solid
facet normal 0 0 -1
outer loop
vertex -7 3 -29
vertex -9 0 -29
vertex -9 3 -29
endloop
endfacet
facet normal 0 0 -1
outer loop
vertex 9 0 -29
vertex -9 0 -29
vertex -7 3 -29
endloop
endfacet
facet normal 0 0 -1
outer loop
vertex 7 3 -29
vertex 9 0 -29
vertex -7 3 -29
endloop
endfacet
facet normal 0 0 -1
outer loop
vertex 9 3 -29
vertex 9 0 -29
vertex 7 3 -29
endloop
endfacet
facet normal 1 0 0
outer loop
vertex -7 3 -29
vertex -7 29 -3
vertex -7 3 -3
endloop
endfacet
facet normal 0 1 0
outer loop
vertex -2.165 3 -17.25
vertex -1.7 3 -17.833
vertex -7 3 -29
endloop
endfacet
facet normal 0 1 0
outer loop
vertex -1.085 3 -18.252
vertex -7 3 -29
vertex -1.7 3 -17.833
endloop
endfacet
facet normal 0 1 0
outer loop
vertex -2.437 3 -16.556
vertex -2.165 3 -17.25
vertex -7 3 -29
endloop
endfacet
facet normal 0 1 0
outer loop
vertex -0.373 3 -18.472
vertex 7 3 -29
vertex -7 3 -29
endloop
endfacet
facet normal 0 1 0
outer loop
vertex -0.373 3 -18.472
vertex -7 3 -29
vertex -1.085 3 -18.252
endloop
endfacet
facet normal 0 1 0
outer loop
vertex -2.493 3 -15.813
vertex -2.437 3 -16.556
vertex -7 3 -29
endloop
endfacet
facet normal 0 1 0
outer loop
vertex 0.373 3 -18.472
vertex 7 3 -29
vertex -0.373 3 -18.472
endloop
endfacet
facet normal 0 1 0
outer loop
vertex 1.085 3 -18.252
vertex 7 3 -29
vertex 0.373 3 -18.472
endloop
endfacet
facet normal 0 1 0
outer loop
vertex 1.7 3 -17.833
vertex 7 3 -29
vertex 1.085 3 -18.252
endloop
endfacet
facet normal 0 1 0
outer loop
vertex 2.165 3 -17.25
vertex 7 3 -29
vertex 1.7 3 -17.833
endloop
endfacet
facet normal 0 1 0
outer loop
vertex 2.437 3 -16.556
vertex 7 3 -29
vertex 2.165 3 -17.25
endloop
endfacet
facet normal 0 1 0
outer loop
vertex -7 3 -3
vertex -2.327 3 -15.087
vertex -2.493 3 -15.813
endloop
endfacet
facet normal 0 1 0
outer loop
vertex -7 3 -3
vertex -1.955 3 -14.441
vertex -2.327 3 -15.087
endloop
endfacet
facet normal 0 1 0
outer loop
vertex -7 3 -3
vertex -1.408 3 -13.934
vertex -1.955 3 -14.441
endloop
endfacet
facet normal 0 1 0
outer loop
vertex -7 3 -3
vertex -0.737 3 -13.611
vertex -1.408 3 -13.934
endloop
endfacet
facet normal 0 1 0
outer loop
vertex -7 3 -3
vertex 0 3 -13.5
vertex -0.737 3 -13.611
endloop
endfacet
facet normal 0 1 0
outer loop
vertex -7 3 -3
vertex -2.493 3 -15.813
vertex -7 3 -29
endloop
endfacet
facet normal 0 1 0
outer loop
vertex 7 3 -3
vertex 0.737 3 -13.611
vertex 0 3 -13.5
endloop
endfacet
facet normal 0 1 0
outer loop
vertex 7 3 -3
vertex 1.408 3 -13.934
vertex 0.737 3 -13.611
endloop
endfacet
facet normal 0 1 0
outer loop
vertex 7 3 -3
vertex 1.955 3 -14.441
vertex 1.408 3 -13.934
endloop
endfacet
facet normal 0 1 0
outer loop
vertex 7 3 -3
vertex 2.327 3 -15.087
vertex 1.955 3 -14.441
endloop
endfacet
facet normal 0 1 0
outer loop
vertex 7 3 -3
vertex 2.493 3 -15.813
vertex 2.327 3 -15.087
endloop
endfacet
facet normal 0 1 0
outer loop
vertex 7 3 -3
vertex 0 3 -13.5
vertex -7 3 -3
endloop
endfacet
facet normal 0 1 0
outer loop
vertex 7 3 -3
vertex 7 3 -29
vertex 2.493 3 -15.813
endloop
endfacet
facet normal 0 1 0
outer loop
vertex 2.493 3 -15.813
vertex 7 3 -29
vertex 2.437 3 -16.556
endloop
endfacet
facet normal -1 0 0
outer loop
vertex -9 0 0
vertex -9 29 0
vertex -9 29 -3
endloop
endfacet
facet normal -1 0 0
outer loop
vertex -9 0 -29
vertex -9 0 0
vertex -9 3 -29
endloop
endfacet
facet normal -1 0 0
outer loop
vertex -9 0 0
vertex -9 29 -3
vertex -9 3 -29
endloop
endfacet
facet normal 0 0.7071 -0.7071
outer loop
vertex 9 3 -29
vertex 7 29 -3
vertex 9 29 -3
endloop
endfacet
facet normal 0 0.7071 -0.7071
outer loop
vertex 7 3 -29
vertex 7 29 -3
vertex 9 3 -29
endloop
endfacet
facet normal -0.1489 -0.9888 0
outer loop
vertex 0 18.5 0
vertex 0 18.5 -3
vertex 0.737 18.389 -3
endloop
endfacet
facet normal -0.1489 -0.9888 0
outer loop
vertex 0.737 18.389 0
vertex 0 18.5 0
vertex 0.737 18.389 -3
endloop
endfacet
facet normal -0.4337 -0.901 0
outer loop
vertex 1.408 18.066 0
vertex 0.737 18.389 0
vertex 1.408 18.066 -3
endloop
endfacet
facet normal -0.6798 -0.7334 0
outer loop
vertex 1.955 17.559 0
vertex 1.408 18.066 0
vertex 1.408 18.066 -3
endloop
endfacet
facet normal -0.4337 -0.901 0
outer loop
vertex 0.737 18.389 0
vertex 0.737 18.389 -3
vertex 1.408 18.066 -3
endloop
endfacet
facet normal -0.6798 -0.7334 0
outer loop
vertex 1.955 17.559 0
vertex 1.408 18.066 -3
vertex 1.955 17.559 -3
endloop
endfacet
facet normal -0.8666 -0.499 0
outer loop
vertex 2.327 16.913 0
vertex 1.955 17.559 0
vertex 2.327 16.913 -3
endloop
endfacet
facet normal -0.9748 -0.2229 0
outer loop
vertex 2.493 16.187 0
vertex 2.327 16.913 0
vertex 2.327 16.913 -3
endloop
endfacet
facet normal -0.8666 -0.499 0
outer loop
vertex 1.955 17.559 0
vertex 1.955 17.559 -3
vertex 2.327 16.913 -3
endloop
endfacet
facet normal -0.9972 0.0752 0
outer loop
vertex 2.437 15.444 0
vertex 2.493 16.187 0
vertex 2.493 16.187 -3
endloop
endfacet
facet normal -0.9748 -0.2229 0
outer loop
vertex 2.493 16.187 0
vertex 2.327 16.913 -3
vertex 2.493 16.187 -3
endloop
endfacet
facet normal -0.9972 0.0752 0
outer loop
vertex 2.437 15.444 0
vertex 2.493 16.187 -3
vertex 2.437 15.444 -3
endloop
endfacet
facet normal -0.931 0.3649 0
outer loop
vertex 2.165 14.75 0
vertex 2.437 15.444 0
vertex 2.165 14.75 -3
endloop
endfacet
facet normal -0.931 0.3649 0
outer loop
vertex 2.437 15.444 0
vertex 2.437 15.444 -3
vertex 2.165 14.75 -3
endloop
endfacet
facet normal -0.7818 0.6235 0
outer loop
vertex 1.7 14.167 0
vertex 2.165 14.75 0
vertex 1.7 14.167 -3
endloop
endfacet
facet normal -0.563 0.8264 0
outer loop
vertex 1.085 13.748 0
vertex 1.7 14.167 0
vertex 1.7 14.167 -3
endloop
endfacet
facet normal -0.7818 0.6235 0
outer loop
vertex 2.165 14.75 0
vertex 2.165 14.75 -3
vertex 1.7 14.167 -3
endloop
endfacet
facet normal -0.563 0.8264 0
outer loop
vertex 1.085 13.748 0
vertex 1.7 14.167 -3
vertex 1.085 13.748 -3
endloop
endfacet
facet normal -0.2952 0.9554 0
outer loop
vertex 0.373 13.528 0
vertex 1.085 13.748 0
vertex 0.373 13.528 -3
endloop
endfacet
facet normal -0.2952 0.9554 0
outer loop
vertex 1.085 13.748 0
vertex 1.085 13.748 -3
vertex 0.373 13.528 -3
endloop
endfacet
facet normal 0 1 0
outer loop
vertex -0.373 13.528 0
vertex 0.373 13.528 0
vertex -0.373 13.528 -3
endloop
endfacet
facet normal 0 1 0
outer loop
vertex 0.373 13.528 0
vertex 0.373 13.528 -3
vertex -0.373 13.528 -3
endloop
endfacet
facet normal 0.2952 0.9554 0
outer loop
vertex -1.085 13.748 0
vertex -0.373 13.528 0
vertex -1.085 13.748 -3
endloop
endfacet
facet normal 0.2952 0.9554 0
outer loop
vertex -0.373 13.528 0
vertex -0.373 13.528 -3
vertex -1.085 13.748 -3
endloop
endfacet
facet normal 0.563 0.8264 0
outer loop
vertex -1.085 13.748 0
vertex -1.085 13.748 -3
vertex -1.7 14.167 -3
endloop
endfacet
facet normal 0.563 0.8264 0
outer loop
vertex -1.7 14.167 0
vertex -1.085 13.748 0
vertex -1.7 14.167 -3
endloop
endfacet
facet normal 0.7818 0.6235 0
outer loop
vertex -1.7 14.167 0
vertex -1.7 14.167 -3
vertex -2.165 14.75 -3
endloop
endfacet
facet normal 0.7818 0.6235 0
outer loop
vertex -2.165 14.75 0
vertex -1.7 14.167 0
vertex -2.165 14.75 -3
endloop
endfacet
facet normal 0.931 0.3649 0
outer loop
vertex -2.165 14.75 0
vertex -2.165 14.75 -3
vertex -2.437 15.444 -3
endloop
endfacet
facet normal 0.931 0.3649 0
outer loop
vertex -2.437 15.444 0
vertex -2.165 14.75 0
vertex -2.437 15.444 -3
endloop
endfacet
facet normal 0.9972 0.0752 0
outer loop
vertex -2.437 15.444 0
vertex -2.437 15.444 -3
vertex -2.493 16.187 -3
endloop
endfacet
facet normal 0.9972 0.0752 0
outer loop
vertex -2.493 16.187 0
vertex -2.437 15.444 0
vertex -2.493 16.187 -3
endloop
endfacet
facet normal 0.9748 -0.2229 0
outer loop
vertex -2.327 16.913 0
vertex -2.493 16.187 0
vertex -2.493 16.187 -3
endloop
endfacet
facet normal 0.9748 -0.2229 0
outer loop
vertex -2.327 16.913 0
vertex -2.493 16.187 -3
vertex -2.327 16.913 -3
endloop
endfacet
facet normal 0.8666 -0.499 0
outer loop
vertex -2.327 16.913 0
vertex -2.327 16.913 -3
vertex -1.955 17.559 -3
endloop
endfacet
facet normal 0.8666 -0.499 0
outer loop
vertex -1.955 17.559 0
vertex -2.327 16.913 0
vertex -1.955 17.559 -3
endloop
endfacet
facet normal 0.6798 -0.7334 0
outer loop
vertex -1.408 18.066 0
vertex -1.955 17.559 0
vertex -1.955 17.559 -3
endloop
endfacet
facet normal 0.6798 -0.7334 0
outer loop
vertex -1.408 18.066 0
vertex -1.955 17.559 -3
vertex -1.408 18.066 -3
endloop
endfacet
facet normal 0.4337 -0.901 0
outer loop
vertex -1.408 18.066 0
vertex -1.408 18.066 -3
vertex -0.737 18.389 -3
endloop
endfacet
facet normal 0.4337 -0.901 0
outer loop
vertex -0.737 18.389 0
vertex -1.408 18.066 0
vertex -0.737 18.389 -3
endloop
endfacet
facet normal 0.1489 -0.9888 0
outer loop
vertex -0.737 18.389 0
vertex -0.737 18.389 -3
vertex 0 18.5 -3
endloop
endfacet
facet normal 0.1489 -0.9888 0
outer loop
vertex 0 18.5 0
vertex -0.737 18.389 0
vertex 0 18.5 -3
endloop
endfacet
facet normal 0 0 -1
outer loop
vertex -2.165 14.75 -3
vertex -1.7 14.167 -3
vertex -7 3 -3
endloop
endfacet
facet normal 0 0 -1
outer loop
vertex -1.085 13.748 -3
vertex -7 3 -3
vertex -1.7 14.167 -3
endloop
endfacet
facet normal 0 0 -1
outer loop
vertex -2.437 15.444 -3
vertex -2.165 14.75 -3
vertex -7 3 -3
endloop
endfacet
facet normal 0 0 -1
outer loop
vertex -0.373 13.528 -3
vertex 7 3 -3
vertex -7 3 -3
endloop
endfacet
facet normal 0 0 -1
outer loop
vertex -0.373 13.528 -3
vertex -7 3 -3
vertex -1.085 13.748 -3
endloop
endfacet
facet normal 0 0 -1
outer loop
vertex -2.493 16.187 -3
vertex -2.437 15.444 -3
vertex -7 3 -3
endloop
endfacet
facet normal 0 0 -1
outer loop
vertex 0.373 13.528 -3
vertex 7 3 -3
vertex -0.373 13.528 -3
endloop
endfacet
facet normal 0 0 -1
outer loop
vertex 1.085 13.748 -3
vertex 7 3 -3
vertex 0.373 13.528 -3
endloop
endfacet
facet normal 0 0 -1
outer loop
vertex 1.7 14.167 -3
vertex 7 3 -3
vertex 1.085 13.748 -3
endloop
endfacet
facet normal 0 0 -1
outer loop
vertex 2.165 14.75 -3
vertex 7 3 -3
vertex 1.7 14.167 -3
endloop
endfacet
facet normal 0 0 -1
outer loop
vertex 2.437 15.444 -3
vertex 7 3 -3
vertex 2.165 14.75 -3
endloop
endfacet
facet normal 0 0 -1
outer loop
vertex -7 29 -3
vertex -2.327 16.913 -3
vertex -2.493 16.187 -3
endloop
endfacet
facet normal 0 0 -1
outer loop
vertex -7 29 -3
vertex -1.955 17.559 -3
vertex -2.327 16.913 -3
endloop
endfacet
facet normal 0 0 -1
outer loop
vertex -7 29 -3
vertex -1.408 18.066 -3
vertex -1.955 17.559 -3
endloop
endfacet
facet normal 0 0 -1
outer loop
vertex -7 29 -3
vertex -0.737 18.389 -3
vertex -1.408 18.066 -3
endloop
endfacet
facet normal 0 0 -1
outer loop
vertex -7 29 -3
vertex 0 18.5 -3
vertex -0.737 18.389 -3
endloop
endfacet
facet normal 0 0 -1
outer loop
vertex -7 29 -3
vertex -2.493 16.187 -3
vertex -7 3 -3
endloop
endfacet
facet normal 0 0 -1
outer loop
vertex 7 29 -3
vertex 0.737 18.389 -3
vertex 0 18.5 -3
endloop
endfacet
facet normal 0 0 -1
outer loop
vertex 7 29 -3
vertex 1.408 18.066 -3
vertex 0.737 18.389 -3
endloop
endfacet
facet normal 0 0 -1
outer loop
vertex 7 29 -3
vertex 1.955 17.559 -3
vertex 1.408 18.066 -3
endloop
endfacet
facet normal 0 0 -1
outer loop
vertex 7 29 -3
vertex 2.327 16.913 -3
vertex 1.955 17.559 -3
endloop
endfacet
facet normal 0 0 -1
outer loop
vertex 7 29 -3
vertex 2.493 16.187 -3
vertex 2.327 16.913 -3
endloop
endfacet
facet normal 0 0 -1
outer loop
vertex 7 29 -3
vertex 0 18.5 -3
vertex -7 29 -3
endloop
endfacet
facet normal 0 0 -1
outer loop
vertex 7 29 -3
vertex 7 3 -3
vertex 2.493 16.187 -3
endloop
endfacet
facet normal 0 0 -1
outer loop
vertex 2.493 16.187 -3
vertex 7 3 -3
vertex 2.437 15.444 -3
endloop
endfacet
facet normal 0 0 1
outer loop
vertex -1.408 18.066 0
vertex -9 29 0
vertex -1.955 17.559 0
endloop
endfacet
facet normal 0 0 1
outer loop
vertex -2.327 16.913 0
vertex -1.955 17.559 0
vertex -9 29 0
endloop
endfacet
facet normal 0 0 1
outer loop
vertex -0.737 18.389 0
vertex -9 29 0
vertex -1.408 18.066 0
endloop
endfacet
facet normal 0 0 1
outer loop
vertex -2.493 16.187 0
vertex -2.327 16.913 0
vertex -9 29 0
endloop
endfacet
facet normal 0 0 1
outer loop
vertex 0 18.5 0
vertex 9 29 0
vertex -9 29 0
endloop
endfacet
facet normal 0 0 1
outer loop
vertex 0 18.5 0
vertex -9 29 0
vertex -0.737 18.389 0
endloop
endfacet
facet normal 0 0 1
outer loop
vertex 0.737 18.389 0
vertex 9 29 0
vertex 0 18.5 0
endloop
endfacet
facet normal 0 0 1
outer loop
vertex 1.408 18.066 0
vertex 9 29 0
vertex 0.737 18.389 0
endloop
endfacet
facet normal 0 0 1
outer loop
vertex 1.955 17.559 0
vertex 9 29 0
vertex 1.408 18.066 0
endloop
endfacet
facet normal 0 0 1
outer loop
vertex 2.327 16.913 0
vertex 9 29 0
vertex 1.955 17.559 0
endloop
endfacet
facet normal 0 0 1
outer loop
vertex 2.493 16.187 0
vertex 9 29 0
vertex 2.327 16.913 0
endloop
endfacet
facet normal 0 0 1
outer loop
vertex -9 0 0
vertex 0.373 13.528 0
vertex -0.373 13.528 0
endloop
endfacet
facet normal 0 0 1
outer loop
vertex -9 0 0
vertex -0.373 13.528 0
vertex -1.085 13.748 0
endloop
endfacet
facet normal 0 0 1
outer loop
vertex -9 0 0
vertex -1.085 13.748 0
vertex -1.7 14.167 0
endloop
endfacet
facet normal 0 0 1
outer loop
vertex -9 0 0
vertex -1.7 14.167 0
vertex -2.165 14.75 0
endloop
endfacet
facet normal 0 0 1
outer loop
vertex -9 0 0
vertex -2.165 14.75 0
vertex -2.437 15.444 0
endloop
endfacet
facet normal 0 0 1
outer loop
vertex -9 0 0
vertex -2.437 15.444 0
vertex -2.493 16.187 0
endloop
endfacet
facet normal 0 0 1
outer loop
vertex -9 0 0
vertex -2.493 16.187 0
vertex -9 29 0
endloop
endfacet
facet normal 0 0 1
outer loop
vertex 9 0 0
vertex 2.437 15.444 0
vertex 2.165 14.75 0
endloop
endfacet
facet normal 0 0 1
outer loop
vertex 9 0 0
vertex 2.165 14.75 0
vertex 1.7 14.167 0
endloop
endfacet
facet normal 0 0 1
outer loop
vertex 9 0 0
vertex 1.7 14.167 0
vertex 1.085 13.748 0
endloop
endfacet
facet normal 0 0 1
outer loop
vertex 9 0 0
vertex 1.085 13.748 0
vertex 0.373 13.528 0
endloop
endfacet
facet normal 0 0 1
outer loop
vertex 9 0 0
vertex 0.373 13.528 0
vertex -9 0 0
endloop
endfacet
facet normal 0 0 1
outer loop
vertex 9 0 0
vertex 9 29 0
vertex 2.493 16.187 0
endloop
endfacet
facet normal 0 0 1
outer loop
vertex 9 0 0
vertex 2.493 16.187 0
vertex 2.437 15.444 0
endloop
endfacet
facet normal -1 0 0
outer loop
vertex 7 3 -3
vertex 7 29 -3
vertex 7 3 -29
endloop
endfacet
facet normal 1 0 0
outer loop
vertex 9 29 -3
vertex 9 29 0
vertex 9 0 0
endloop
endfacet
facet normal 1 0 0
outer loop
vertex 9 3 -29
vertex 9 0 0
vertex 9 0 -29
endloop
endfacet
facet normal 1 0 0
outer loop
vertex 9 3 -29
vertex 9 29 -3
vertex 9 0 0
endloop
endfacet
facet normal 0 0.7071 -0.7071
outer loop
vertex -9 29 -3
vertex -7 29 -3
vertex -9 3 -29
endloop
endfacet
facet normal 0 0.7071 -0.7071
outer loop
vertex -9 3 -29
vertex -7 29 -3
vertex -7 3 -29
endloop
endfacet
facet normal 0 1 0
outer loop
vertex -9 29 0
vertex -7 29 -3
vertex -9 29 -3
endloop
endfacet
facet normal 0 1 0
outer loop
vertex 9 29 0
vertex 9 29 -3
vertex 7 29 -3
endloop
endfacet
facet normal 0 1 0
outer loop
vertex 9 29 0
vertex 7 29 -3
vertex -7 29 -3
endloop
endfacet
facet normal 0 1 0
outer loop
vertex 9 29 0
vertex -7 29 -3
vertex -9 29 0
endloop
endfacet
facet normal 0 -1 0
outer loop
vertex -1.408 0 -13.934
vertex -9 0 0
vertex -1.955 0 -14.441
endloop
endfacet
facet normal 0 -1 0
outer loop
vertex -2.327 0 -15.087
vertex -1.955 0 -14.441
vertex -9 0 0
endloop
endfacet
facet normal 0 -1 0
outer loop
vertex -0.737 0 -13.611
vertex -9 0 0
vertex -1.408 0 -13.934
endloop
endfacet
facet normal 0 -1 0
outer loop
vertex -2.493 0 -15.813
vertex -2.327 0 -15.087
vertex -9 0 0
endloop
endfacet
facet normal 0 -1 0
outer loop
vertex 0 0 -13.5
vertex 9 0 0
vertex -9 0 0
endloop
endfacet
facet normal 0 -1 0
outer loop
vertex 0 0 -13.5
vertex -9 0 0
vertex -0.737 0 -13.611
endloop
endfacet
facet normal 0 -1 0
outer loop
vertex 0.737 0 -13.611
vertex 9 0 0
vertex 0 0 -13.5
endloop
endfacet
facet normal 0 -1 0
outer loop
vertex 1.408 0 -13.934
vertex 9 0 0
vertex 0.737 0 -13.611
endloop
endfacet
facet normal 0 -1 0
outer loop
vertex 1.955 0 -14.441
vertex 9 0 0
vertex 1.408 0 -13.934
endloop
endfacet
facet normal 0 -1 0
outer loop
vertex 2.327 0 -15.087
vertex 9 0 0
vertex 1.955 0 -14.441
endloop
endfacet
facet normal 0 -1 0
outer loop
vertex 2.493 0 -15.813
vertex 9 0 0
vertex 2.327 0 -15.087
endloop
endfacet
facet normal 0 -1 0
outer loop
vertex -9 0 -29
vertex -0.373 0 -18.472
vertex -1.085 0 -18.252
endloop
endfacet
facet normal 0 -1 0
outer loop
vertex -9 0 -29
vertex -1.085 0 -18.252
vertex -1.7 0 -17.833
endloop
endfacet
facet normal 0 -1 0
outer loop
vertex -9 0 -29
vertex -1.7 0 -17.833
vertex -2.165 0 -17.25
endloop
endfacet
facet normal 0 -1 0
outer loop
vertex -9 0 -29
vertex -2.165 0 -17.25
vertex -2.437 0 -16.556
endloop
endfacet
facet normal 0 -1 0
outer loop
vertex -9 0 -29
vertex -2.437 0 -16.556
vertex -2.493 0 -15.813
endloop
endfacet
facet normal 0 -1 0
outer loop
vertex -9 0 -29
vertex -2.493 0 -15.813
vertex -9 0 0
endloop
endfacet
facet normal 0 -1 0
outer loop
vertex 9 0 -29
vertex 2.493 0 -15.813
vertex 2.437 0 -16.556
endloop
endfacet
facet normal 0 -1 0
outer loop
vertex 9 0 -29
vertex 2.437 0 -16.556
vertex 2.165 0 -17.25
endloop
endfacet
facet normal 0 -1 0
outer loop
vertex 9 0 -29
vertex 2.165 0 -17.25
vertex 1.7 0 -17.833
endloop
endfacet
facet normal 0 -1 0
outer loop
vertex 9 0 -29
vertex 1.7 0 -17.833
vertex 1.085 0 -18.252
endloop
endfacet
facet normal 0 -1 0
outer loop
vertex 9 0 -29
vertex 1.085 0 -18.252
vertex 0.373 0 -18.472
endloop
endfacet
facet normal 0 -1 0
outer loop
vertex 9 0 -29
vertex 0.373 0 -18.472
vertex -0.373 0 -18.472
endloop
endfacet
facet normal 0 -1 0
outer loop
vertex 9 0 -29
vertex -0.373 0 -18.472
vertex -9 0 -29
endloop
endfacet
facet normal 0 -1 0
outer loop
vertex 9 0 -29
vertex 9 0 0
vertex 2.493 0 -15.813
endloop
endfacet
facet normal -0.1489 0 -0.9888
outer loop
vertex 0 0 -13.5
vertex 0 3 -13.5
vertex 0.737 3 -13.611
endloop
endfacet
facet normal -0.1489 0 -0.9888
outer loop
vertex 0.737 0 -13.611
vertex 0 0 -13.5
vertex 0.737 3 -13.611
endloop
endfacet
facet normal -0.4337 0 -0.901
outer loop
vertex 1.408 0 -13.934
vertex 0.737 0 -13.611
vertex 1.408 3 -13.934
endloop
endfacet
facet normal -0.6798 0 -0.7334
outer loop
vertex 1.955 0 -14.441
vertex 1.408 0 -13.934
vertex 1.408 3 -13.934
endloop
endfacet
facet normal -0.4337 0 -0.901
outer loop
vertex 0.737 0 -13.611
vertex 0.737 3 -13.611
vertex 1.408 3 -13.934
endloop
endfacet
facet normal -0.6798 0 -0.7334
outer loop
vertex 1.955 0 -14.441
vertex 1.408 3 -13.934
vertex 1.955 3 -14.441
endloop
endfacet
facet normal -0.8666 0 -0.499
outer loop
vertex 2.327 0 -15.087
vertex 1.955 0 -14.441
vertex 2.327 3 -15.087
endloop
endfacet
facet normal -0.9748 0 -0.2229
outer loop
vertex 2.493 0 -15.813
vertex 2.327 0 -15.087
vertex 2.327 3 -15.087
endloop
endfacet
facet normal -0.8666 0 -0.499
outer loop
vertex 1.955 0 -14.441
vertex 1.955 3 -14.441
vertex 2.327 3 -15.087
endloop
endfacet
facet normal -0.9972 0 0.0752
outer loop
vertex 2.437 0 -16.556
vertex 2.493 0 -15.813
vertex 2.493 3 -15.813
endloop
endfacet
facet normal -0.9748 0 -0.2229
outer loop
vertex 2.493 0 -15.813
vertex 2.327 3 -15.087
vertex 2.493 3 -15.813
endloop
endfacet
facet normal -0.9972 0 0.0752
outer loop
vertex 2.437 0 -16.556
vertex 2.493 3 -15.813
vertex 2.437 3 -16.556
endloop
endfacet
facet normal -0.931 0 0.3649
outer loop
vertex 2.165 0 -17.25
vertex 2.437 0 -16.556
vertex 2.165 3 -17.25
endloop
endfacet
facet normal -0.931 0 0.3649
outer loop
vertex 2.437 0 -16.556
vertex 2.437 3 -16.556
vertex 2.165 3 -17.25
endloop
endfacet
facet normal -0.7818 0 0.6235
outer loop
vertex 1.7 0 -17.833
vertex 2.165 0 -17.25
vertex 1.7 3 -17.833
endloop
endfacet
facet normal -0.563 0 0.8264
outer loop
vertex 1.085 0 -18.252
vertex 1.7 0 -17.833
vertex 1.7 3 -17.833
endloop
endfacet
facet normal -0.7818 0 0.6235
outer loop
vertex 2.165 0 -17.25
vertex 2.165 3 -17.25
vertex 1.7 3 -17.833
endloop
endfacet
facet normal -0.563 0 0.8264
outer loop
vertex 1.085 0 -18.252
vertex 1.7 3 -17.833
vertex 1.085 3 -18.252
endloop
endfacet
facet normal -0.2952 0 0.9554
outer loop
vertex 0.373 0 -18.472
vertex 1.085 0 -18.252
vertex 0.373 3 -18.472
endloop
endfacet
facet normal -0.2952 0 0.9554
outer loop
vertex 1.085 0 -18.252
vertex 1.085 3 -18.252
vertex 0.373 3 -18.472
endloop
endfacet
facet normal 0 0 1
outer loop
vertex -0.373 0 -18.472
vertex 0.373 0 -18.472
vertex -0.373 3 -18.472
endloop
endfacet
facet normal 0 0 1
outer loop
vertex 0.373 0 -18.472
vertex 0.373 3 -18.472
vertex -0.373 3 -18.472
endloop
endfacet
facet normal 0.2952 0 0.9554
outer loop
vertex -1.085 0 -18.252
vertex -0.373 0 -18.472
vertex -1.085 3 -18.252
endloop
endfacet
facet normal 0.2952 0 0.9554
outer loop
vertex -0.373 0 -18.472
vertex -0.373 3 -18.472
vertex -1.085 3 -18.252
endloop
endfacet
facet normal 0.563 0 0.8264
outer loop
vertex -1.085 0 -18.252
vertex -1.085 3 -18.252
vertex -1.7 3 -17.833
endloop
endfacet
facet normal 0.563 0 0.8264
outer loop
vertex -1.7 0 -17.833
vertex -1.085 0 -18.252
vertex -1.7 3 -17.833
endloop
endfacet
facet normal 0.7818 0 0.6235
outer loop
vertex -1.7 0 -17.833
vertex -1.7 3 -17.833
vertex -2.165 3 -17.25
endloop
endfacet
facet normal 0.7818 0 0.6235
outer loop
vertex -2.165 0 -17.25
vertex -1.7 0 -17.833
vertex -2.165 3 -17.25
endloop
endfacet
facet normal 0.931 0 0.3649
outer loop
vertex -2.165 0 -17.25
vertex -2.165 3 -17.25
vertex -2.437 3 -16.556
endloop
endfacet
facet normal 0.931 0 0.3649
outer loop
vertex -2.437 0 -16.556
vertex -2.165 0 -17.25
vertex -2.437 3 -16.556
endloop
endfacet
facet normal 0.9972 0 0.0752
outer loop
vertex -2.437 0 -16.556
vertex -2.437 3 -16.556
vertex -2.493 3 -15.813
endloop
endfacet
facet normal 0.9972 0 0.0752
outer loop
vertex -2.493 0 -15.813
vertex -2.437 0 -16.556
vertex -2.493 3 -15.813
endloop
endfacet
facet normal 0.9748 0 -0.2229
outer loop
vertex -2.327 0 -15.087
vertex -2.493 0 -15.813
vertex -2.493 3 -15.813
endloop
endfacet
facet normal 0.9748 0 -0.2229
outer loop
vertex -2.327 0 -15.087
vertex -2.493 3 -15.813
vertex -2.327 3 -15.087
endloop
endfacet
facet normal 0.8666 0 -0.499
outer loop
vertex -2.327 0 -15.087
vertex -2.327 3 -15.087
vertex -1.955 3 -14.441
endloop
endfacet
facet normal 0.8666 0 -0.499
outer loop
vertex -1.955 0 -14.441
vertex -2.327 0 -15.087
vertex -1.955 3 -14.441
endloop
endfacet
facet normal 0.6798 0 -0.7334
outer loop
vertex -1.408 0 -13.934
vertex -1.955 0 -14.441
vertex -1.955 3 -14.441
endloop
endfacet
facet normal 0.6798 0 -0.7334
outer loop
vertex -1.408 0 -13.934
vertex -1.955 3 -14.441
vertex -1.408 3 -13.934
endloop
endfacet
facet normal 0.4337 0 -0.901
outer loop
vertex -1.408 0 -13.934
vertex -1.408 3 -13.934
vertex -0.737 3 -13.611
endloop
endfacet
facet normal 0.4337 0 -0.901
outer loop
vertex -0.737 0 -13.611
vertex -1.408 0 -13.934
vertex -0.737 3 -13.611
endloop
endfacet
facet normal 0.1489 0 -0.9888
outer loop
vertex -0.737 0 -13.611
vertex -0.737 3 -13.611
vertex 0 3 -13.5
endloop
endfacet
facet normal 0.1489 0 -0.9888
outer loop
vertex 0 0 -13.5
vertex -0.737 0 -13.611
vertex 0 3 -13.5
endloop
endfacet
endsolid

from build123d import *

# Parameters (mm, degrees)
EXTRUDE_THIN1_DEPTH      = 9
EXTRUDE_THIN1_DEPTH_BACK = 9
RIB1_REACH               = 46.788
SKETCH2_WALL_W           = 128.346335328
SKETCH2_WALL_H           = 2
SKETCH3_R                = 2.5
CUT_EXTRUDE1_DEPTH       = 10
SKETCH4_R                = 2.5
CUT_EXTRUDE2_DEPTH       = 10


with BuildPart() as part:
    # Sketch1 → Extrude-Thin1 (new, two sides)
    with BuildSketch(Plane(origin=(0, 0, 0), x_dir=(0, 0, -1), z_dir=(1, 0, 0))) as extrude_thin1_sk:
        Polygon((0, 29), (0, 0), (29, 0), (29, 3), (3, 3), (3, 29), align=None)
    extrude(amount=EXTRUDE_THIN1_DEPTH)
    extrude(extrude_thin1_sk.sketch, amount=-EXTRUDE_THIN1_DEPTH_BACK)

    # Sketch2 wall → Rib1 (add, up to next)
    with BuildSketch(Plane(origin=(9, 16, -16), x_dir=(0, -0.707106781187, -0.707106781187), z_dir=(0, 0.707106781187, -0.707106781187)), mode=Mode.PRIVATE) as rib1_sk1:
        with Locations((0, 1)):
            Rectangle(SKETCH2_WALL_W, SKETCH2_WALL_H)
    rib1_tool1 = extrude(rib1_sk1.sketch, amount=-RIB1_REACH, mode=Mode.PRIVATE) - part.part
    rib1 = rib1_tool1.solids().sort_by_distance((9, 16, -16))[0]
    add(rib1)

    # Mirror1: Rib1 across plane
    add(rib1.mirror(Plane(origin=(0, 0, 0), x_dir=(0, 0, 1), z_dir=(1, 0, 0))))

    # Sketch3 → Cut-Extrude1 (cut)
    with BuildSketch(Plane(origin=(0, 3, 0), x_dir=(1, 0, 0), z_dir=(0, 1, 0))):
        with Locations(Location((0, 16, 0), (0, 0, 270))):
            Circle(SKETCH3_R)
    extrude(amount=-CUT_EXTRUDE1_DEPTH, mode=Mode.SUBTRACT)

    # Sketch4 → Cut-Extrude2 (cut)
    with BuildSketch(Plane(origin=(0, 0, -3), x_dir=(-1, 0, 0), z_dir=(0, 0, -1))):
        with Locations(Location((0, 16, 0), (0, 0, 90))):
            Circle(SKETCH4_R)
    extrude(amount=-CUT_EXTRUDE2_DEPTH, mode=Mode.SUBTRACT)


solid = part.part
